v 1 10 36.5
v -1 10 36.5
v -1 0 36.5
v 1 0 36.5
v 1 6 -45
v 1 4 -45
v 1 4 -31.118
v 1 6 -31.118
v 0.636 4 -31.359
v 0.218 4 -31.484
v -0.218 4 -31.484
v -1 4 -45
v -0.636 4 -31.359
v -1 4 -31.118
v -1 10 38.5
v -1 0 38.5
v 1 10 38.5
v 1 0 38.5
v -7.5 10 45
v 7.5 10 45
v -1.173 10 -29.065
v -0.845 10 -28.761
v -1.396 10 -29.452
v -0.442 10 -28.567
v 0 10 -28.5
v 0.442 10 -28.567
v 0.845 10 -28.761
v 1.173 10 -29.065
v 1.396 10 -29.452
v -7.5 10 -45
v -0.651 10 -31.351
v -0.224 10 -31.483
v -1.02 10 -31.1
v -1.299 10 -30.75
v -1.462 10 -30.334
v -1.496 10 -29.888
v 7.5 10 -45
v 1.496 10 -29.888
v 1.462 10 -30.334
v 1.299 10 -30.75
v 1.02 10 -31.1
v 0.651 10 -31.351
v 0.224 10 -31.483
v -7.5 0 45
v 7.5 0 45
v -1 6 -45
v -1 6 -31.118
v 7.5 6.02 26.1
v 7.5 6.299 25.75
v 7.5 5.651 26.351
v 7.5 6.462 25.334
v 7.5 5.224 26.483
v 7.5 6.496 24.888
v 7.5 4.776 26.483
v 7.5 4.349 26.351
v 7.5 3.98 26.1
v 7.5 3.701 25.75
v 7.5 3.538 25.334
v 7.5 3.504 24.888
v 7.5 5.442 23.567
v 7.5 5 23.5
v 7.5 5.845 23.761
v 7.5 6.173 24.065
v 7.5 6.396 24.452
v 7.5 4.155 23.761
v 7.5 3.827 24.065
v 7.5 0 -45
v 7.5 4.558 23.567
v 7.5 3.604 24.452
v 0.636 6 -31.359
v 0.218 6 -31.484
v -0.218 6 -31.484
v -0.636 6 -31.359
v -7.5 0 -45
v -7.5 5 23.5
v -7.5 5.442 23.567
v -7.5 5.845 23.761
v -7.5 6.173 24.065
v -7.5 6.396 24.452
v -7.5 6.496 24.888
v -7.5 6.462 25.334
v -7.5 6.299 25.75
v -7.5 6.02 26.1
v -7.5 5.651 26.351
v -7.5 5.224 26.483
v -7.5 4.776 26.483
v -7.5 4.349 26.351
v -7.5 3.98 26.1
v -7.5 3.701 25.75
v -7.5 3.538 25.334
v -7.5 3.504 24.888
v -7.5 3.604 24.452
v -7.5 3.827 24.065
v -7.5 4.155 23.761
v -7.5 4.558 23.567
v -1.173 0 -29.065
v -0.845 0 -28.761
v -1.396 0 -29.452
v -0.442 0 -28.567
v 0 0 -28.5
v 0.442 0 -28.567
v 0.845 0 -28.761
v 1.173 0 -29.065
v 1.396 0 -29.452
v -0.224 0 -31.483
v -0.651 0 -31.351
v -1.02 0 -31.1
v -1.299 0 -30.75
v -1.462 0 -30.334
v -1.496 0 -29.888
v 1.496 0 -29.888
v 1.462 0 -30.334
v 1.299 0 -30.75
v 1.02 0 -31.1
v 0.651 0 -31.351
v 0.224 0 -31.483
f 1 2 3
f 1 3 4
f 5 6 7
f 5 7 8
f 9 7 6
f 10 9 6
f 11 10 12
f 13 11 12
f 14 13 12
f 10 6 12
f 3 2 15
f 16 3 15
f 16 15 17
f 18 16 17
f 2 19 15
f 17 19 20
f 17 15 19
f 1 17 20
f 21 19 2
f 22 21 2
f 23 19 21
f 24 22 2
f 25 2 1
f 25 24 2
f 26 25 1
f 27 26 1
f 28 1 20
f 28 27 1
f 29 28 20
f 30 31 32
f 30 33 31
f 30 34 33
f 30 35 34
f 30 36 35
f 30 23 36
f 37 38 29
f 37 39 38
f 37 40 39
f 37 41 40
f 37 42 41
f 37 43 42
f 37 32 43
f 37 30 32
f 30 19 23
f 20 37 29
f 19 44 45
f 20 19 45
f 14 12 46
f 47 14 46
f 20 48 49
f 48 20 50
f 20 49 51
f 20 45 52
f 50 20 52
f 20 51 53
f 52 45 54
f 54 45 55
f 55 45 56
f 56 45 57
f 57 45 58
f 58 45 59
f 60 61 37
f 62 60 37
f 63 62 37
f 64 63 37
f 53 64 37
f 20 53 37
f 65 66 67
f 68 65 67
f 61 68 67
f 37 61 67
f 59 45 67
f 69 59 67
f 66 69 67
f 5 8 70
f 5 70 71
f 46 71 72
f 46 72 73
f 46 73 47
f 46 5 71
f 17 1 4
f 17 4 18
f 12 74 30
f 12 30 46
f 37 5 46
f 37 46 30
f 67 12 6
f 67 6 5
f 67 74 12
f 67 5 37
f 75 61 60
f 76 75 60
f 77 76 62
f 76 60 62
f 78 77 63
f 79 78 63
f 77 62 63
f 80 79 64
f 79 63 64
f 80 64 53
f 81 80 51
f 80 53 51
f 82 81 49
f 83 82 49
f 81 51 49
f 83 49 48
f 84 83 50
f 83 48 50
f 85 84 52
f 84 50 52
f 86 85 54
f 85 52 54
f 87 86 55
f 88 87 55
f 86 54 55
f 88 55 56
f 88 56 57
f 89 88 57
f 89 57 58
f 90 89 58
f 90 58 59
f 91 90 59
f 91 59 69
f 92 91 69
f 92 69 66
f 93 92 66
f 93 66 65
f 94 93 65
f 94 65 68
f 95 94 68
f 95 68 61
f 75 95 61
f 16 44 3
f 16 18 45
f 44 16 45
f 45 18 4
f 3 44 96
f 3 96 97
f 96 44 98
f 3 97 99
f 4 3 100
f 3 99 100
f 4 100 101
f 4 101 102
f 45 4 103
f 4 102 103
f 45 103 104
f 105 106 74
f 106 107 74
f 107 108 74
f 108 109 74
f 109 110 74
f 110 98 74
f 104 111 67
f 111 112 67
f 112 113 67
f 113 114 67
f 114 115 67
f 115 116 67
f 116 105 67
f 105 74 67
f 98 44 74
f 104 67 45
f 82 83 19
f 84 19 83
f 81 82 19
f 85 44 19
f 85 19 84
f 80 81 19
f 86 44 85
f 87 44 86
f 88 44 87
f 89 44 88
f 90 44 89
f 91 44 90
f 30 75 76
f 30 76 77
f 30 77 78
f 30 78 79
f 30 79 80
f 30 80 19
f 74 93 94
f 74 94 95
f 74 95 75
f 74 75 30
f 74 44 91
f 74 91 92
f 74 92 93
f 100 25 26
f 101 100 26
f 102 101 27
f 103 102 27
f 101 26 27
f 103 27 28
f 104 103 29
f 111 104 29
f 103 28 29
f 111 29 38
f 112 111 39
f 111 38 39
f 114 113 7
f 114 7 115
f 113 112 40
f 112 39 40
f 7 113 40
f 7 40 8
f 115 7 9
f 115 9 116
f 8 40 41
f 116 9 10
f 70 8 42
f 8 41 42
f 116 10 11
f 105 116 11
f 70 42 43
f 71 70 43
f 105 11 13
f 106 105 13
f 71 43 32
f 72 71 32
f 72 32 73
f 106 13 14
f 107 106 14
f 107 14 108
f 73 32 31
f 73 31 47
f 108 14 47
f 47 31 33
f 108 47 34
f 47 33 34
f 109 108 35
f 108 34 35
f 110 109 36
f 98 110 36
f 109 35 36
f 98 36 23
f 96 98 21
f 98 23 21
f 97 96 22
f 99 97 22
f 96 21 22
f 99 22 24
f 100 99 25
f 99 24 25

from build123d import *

# Parameters (mm, degrees)
SKETCH1_W           = 15
SKETCH1_H           = 90
BOSS_EXTRUDE1_DEPTH = 10
SKETCH2_R           = 1.5
CUT_EXTRUDE1_DEPTH  = 49.476798574
SKETCH5_W           = 2
SKETCH5_H           = 2
CUT_EXTRUDE4_DEPTH  = 47.703854231
SKETCH6_R           = 1.5
CUT_EXTRUDE5_DEPTH  = 47.703854231
SKETCH7_W           = 2
SKETCH7_H           = 2
CUT_EXTRUDE6_DEPTH  = 15


with BuildPart() as part:
    # Sketch1 → Boss-Extrude1 (new body)
    with BuildSketch(Plane(origin=(0, 0, 0), x_dir=(1, 0, 0), z_dir=(0, 1, 0))):
        Rectangle(SKETCH1_W, SKETCH1_H)
    extrude(amount=BOSS_EXTRUDE1_DEPTH)

    # Sketch2 → Cut-Extrude1 (cut, through all)
    with BuildSketch(Plane(origin=(7.5, 0, 0), x_dir=(0, 0, -1), z_dir=(1, 0, 0))):
        with Locations((-25, 5)):
            Circle(SKETCH2_R)
    extrude(amount=-CUT_EXTRUDE1_DEPTH, mode=Mode.SUBTRACT)

    # Sketch5 → Cut-Extrude4 (cut, through all)
    with BuildSketch(Plane.XZ):
        with Locations((0, 37.5)):
            Rectangle(SKETCH5_W, SKETCH5_H)
    extrude(amount=-CUT_EXTRUDE4_DEPTH, mode=Mode.SUBTRACT)

    # Sketch6 → Cut-Extrude5 (cut, through all)
    with BuildSketch(Plane(origin=(0, 10, 0), x_dir=(-1, 0, 0), z_dir=(0, 1, 0))):
        with Locations(Location((0, -30, 0), (0, 0, 90))):
            Circle(SKETCH6_R)
    extrude(amount=-CUT_EXTRUDE5_DEPTH, mode=Mode.SUBTRACT)

    # Sketch7 → Cut-Extrude6 (cut)
    with BuildSketch(Plane(origin=(0, 0, -45), x_dir=(-1, 0, 0), z_dir=(0, 0, -1))):
        with Locations((0, 5)):
            Rectangle(SKETCH7_W, SKETCH7_H)
    extrude(amount=-CUT_EXTRUDE6_DEPTH, mode=Mode.SUBTRACT)


solid = part.part
